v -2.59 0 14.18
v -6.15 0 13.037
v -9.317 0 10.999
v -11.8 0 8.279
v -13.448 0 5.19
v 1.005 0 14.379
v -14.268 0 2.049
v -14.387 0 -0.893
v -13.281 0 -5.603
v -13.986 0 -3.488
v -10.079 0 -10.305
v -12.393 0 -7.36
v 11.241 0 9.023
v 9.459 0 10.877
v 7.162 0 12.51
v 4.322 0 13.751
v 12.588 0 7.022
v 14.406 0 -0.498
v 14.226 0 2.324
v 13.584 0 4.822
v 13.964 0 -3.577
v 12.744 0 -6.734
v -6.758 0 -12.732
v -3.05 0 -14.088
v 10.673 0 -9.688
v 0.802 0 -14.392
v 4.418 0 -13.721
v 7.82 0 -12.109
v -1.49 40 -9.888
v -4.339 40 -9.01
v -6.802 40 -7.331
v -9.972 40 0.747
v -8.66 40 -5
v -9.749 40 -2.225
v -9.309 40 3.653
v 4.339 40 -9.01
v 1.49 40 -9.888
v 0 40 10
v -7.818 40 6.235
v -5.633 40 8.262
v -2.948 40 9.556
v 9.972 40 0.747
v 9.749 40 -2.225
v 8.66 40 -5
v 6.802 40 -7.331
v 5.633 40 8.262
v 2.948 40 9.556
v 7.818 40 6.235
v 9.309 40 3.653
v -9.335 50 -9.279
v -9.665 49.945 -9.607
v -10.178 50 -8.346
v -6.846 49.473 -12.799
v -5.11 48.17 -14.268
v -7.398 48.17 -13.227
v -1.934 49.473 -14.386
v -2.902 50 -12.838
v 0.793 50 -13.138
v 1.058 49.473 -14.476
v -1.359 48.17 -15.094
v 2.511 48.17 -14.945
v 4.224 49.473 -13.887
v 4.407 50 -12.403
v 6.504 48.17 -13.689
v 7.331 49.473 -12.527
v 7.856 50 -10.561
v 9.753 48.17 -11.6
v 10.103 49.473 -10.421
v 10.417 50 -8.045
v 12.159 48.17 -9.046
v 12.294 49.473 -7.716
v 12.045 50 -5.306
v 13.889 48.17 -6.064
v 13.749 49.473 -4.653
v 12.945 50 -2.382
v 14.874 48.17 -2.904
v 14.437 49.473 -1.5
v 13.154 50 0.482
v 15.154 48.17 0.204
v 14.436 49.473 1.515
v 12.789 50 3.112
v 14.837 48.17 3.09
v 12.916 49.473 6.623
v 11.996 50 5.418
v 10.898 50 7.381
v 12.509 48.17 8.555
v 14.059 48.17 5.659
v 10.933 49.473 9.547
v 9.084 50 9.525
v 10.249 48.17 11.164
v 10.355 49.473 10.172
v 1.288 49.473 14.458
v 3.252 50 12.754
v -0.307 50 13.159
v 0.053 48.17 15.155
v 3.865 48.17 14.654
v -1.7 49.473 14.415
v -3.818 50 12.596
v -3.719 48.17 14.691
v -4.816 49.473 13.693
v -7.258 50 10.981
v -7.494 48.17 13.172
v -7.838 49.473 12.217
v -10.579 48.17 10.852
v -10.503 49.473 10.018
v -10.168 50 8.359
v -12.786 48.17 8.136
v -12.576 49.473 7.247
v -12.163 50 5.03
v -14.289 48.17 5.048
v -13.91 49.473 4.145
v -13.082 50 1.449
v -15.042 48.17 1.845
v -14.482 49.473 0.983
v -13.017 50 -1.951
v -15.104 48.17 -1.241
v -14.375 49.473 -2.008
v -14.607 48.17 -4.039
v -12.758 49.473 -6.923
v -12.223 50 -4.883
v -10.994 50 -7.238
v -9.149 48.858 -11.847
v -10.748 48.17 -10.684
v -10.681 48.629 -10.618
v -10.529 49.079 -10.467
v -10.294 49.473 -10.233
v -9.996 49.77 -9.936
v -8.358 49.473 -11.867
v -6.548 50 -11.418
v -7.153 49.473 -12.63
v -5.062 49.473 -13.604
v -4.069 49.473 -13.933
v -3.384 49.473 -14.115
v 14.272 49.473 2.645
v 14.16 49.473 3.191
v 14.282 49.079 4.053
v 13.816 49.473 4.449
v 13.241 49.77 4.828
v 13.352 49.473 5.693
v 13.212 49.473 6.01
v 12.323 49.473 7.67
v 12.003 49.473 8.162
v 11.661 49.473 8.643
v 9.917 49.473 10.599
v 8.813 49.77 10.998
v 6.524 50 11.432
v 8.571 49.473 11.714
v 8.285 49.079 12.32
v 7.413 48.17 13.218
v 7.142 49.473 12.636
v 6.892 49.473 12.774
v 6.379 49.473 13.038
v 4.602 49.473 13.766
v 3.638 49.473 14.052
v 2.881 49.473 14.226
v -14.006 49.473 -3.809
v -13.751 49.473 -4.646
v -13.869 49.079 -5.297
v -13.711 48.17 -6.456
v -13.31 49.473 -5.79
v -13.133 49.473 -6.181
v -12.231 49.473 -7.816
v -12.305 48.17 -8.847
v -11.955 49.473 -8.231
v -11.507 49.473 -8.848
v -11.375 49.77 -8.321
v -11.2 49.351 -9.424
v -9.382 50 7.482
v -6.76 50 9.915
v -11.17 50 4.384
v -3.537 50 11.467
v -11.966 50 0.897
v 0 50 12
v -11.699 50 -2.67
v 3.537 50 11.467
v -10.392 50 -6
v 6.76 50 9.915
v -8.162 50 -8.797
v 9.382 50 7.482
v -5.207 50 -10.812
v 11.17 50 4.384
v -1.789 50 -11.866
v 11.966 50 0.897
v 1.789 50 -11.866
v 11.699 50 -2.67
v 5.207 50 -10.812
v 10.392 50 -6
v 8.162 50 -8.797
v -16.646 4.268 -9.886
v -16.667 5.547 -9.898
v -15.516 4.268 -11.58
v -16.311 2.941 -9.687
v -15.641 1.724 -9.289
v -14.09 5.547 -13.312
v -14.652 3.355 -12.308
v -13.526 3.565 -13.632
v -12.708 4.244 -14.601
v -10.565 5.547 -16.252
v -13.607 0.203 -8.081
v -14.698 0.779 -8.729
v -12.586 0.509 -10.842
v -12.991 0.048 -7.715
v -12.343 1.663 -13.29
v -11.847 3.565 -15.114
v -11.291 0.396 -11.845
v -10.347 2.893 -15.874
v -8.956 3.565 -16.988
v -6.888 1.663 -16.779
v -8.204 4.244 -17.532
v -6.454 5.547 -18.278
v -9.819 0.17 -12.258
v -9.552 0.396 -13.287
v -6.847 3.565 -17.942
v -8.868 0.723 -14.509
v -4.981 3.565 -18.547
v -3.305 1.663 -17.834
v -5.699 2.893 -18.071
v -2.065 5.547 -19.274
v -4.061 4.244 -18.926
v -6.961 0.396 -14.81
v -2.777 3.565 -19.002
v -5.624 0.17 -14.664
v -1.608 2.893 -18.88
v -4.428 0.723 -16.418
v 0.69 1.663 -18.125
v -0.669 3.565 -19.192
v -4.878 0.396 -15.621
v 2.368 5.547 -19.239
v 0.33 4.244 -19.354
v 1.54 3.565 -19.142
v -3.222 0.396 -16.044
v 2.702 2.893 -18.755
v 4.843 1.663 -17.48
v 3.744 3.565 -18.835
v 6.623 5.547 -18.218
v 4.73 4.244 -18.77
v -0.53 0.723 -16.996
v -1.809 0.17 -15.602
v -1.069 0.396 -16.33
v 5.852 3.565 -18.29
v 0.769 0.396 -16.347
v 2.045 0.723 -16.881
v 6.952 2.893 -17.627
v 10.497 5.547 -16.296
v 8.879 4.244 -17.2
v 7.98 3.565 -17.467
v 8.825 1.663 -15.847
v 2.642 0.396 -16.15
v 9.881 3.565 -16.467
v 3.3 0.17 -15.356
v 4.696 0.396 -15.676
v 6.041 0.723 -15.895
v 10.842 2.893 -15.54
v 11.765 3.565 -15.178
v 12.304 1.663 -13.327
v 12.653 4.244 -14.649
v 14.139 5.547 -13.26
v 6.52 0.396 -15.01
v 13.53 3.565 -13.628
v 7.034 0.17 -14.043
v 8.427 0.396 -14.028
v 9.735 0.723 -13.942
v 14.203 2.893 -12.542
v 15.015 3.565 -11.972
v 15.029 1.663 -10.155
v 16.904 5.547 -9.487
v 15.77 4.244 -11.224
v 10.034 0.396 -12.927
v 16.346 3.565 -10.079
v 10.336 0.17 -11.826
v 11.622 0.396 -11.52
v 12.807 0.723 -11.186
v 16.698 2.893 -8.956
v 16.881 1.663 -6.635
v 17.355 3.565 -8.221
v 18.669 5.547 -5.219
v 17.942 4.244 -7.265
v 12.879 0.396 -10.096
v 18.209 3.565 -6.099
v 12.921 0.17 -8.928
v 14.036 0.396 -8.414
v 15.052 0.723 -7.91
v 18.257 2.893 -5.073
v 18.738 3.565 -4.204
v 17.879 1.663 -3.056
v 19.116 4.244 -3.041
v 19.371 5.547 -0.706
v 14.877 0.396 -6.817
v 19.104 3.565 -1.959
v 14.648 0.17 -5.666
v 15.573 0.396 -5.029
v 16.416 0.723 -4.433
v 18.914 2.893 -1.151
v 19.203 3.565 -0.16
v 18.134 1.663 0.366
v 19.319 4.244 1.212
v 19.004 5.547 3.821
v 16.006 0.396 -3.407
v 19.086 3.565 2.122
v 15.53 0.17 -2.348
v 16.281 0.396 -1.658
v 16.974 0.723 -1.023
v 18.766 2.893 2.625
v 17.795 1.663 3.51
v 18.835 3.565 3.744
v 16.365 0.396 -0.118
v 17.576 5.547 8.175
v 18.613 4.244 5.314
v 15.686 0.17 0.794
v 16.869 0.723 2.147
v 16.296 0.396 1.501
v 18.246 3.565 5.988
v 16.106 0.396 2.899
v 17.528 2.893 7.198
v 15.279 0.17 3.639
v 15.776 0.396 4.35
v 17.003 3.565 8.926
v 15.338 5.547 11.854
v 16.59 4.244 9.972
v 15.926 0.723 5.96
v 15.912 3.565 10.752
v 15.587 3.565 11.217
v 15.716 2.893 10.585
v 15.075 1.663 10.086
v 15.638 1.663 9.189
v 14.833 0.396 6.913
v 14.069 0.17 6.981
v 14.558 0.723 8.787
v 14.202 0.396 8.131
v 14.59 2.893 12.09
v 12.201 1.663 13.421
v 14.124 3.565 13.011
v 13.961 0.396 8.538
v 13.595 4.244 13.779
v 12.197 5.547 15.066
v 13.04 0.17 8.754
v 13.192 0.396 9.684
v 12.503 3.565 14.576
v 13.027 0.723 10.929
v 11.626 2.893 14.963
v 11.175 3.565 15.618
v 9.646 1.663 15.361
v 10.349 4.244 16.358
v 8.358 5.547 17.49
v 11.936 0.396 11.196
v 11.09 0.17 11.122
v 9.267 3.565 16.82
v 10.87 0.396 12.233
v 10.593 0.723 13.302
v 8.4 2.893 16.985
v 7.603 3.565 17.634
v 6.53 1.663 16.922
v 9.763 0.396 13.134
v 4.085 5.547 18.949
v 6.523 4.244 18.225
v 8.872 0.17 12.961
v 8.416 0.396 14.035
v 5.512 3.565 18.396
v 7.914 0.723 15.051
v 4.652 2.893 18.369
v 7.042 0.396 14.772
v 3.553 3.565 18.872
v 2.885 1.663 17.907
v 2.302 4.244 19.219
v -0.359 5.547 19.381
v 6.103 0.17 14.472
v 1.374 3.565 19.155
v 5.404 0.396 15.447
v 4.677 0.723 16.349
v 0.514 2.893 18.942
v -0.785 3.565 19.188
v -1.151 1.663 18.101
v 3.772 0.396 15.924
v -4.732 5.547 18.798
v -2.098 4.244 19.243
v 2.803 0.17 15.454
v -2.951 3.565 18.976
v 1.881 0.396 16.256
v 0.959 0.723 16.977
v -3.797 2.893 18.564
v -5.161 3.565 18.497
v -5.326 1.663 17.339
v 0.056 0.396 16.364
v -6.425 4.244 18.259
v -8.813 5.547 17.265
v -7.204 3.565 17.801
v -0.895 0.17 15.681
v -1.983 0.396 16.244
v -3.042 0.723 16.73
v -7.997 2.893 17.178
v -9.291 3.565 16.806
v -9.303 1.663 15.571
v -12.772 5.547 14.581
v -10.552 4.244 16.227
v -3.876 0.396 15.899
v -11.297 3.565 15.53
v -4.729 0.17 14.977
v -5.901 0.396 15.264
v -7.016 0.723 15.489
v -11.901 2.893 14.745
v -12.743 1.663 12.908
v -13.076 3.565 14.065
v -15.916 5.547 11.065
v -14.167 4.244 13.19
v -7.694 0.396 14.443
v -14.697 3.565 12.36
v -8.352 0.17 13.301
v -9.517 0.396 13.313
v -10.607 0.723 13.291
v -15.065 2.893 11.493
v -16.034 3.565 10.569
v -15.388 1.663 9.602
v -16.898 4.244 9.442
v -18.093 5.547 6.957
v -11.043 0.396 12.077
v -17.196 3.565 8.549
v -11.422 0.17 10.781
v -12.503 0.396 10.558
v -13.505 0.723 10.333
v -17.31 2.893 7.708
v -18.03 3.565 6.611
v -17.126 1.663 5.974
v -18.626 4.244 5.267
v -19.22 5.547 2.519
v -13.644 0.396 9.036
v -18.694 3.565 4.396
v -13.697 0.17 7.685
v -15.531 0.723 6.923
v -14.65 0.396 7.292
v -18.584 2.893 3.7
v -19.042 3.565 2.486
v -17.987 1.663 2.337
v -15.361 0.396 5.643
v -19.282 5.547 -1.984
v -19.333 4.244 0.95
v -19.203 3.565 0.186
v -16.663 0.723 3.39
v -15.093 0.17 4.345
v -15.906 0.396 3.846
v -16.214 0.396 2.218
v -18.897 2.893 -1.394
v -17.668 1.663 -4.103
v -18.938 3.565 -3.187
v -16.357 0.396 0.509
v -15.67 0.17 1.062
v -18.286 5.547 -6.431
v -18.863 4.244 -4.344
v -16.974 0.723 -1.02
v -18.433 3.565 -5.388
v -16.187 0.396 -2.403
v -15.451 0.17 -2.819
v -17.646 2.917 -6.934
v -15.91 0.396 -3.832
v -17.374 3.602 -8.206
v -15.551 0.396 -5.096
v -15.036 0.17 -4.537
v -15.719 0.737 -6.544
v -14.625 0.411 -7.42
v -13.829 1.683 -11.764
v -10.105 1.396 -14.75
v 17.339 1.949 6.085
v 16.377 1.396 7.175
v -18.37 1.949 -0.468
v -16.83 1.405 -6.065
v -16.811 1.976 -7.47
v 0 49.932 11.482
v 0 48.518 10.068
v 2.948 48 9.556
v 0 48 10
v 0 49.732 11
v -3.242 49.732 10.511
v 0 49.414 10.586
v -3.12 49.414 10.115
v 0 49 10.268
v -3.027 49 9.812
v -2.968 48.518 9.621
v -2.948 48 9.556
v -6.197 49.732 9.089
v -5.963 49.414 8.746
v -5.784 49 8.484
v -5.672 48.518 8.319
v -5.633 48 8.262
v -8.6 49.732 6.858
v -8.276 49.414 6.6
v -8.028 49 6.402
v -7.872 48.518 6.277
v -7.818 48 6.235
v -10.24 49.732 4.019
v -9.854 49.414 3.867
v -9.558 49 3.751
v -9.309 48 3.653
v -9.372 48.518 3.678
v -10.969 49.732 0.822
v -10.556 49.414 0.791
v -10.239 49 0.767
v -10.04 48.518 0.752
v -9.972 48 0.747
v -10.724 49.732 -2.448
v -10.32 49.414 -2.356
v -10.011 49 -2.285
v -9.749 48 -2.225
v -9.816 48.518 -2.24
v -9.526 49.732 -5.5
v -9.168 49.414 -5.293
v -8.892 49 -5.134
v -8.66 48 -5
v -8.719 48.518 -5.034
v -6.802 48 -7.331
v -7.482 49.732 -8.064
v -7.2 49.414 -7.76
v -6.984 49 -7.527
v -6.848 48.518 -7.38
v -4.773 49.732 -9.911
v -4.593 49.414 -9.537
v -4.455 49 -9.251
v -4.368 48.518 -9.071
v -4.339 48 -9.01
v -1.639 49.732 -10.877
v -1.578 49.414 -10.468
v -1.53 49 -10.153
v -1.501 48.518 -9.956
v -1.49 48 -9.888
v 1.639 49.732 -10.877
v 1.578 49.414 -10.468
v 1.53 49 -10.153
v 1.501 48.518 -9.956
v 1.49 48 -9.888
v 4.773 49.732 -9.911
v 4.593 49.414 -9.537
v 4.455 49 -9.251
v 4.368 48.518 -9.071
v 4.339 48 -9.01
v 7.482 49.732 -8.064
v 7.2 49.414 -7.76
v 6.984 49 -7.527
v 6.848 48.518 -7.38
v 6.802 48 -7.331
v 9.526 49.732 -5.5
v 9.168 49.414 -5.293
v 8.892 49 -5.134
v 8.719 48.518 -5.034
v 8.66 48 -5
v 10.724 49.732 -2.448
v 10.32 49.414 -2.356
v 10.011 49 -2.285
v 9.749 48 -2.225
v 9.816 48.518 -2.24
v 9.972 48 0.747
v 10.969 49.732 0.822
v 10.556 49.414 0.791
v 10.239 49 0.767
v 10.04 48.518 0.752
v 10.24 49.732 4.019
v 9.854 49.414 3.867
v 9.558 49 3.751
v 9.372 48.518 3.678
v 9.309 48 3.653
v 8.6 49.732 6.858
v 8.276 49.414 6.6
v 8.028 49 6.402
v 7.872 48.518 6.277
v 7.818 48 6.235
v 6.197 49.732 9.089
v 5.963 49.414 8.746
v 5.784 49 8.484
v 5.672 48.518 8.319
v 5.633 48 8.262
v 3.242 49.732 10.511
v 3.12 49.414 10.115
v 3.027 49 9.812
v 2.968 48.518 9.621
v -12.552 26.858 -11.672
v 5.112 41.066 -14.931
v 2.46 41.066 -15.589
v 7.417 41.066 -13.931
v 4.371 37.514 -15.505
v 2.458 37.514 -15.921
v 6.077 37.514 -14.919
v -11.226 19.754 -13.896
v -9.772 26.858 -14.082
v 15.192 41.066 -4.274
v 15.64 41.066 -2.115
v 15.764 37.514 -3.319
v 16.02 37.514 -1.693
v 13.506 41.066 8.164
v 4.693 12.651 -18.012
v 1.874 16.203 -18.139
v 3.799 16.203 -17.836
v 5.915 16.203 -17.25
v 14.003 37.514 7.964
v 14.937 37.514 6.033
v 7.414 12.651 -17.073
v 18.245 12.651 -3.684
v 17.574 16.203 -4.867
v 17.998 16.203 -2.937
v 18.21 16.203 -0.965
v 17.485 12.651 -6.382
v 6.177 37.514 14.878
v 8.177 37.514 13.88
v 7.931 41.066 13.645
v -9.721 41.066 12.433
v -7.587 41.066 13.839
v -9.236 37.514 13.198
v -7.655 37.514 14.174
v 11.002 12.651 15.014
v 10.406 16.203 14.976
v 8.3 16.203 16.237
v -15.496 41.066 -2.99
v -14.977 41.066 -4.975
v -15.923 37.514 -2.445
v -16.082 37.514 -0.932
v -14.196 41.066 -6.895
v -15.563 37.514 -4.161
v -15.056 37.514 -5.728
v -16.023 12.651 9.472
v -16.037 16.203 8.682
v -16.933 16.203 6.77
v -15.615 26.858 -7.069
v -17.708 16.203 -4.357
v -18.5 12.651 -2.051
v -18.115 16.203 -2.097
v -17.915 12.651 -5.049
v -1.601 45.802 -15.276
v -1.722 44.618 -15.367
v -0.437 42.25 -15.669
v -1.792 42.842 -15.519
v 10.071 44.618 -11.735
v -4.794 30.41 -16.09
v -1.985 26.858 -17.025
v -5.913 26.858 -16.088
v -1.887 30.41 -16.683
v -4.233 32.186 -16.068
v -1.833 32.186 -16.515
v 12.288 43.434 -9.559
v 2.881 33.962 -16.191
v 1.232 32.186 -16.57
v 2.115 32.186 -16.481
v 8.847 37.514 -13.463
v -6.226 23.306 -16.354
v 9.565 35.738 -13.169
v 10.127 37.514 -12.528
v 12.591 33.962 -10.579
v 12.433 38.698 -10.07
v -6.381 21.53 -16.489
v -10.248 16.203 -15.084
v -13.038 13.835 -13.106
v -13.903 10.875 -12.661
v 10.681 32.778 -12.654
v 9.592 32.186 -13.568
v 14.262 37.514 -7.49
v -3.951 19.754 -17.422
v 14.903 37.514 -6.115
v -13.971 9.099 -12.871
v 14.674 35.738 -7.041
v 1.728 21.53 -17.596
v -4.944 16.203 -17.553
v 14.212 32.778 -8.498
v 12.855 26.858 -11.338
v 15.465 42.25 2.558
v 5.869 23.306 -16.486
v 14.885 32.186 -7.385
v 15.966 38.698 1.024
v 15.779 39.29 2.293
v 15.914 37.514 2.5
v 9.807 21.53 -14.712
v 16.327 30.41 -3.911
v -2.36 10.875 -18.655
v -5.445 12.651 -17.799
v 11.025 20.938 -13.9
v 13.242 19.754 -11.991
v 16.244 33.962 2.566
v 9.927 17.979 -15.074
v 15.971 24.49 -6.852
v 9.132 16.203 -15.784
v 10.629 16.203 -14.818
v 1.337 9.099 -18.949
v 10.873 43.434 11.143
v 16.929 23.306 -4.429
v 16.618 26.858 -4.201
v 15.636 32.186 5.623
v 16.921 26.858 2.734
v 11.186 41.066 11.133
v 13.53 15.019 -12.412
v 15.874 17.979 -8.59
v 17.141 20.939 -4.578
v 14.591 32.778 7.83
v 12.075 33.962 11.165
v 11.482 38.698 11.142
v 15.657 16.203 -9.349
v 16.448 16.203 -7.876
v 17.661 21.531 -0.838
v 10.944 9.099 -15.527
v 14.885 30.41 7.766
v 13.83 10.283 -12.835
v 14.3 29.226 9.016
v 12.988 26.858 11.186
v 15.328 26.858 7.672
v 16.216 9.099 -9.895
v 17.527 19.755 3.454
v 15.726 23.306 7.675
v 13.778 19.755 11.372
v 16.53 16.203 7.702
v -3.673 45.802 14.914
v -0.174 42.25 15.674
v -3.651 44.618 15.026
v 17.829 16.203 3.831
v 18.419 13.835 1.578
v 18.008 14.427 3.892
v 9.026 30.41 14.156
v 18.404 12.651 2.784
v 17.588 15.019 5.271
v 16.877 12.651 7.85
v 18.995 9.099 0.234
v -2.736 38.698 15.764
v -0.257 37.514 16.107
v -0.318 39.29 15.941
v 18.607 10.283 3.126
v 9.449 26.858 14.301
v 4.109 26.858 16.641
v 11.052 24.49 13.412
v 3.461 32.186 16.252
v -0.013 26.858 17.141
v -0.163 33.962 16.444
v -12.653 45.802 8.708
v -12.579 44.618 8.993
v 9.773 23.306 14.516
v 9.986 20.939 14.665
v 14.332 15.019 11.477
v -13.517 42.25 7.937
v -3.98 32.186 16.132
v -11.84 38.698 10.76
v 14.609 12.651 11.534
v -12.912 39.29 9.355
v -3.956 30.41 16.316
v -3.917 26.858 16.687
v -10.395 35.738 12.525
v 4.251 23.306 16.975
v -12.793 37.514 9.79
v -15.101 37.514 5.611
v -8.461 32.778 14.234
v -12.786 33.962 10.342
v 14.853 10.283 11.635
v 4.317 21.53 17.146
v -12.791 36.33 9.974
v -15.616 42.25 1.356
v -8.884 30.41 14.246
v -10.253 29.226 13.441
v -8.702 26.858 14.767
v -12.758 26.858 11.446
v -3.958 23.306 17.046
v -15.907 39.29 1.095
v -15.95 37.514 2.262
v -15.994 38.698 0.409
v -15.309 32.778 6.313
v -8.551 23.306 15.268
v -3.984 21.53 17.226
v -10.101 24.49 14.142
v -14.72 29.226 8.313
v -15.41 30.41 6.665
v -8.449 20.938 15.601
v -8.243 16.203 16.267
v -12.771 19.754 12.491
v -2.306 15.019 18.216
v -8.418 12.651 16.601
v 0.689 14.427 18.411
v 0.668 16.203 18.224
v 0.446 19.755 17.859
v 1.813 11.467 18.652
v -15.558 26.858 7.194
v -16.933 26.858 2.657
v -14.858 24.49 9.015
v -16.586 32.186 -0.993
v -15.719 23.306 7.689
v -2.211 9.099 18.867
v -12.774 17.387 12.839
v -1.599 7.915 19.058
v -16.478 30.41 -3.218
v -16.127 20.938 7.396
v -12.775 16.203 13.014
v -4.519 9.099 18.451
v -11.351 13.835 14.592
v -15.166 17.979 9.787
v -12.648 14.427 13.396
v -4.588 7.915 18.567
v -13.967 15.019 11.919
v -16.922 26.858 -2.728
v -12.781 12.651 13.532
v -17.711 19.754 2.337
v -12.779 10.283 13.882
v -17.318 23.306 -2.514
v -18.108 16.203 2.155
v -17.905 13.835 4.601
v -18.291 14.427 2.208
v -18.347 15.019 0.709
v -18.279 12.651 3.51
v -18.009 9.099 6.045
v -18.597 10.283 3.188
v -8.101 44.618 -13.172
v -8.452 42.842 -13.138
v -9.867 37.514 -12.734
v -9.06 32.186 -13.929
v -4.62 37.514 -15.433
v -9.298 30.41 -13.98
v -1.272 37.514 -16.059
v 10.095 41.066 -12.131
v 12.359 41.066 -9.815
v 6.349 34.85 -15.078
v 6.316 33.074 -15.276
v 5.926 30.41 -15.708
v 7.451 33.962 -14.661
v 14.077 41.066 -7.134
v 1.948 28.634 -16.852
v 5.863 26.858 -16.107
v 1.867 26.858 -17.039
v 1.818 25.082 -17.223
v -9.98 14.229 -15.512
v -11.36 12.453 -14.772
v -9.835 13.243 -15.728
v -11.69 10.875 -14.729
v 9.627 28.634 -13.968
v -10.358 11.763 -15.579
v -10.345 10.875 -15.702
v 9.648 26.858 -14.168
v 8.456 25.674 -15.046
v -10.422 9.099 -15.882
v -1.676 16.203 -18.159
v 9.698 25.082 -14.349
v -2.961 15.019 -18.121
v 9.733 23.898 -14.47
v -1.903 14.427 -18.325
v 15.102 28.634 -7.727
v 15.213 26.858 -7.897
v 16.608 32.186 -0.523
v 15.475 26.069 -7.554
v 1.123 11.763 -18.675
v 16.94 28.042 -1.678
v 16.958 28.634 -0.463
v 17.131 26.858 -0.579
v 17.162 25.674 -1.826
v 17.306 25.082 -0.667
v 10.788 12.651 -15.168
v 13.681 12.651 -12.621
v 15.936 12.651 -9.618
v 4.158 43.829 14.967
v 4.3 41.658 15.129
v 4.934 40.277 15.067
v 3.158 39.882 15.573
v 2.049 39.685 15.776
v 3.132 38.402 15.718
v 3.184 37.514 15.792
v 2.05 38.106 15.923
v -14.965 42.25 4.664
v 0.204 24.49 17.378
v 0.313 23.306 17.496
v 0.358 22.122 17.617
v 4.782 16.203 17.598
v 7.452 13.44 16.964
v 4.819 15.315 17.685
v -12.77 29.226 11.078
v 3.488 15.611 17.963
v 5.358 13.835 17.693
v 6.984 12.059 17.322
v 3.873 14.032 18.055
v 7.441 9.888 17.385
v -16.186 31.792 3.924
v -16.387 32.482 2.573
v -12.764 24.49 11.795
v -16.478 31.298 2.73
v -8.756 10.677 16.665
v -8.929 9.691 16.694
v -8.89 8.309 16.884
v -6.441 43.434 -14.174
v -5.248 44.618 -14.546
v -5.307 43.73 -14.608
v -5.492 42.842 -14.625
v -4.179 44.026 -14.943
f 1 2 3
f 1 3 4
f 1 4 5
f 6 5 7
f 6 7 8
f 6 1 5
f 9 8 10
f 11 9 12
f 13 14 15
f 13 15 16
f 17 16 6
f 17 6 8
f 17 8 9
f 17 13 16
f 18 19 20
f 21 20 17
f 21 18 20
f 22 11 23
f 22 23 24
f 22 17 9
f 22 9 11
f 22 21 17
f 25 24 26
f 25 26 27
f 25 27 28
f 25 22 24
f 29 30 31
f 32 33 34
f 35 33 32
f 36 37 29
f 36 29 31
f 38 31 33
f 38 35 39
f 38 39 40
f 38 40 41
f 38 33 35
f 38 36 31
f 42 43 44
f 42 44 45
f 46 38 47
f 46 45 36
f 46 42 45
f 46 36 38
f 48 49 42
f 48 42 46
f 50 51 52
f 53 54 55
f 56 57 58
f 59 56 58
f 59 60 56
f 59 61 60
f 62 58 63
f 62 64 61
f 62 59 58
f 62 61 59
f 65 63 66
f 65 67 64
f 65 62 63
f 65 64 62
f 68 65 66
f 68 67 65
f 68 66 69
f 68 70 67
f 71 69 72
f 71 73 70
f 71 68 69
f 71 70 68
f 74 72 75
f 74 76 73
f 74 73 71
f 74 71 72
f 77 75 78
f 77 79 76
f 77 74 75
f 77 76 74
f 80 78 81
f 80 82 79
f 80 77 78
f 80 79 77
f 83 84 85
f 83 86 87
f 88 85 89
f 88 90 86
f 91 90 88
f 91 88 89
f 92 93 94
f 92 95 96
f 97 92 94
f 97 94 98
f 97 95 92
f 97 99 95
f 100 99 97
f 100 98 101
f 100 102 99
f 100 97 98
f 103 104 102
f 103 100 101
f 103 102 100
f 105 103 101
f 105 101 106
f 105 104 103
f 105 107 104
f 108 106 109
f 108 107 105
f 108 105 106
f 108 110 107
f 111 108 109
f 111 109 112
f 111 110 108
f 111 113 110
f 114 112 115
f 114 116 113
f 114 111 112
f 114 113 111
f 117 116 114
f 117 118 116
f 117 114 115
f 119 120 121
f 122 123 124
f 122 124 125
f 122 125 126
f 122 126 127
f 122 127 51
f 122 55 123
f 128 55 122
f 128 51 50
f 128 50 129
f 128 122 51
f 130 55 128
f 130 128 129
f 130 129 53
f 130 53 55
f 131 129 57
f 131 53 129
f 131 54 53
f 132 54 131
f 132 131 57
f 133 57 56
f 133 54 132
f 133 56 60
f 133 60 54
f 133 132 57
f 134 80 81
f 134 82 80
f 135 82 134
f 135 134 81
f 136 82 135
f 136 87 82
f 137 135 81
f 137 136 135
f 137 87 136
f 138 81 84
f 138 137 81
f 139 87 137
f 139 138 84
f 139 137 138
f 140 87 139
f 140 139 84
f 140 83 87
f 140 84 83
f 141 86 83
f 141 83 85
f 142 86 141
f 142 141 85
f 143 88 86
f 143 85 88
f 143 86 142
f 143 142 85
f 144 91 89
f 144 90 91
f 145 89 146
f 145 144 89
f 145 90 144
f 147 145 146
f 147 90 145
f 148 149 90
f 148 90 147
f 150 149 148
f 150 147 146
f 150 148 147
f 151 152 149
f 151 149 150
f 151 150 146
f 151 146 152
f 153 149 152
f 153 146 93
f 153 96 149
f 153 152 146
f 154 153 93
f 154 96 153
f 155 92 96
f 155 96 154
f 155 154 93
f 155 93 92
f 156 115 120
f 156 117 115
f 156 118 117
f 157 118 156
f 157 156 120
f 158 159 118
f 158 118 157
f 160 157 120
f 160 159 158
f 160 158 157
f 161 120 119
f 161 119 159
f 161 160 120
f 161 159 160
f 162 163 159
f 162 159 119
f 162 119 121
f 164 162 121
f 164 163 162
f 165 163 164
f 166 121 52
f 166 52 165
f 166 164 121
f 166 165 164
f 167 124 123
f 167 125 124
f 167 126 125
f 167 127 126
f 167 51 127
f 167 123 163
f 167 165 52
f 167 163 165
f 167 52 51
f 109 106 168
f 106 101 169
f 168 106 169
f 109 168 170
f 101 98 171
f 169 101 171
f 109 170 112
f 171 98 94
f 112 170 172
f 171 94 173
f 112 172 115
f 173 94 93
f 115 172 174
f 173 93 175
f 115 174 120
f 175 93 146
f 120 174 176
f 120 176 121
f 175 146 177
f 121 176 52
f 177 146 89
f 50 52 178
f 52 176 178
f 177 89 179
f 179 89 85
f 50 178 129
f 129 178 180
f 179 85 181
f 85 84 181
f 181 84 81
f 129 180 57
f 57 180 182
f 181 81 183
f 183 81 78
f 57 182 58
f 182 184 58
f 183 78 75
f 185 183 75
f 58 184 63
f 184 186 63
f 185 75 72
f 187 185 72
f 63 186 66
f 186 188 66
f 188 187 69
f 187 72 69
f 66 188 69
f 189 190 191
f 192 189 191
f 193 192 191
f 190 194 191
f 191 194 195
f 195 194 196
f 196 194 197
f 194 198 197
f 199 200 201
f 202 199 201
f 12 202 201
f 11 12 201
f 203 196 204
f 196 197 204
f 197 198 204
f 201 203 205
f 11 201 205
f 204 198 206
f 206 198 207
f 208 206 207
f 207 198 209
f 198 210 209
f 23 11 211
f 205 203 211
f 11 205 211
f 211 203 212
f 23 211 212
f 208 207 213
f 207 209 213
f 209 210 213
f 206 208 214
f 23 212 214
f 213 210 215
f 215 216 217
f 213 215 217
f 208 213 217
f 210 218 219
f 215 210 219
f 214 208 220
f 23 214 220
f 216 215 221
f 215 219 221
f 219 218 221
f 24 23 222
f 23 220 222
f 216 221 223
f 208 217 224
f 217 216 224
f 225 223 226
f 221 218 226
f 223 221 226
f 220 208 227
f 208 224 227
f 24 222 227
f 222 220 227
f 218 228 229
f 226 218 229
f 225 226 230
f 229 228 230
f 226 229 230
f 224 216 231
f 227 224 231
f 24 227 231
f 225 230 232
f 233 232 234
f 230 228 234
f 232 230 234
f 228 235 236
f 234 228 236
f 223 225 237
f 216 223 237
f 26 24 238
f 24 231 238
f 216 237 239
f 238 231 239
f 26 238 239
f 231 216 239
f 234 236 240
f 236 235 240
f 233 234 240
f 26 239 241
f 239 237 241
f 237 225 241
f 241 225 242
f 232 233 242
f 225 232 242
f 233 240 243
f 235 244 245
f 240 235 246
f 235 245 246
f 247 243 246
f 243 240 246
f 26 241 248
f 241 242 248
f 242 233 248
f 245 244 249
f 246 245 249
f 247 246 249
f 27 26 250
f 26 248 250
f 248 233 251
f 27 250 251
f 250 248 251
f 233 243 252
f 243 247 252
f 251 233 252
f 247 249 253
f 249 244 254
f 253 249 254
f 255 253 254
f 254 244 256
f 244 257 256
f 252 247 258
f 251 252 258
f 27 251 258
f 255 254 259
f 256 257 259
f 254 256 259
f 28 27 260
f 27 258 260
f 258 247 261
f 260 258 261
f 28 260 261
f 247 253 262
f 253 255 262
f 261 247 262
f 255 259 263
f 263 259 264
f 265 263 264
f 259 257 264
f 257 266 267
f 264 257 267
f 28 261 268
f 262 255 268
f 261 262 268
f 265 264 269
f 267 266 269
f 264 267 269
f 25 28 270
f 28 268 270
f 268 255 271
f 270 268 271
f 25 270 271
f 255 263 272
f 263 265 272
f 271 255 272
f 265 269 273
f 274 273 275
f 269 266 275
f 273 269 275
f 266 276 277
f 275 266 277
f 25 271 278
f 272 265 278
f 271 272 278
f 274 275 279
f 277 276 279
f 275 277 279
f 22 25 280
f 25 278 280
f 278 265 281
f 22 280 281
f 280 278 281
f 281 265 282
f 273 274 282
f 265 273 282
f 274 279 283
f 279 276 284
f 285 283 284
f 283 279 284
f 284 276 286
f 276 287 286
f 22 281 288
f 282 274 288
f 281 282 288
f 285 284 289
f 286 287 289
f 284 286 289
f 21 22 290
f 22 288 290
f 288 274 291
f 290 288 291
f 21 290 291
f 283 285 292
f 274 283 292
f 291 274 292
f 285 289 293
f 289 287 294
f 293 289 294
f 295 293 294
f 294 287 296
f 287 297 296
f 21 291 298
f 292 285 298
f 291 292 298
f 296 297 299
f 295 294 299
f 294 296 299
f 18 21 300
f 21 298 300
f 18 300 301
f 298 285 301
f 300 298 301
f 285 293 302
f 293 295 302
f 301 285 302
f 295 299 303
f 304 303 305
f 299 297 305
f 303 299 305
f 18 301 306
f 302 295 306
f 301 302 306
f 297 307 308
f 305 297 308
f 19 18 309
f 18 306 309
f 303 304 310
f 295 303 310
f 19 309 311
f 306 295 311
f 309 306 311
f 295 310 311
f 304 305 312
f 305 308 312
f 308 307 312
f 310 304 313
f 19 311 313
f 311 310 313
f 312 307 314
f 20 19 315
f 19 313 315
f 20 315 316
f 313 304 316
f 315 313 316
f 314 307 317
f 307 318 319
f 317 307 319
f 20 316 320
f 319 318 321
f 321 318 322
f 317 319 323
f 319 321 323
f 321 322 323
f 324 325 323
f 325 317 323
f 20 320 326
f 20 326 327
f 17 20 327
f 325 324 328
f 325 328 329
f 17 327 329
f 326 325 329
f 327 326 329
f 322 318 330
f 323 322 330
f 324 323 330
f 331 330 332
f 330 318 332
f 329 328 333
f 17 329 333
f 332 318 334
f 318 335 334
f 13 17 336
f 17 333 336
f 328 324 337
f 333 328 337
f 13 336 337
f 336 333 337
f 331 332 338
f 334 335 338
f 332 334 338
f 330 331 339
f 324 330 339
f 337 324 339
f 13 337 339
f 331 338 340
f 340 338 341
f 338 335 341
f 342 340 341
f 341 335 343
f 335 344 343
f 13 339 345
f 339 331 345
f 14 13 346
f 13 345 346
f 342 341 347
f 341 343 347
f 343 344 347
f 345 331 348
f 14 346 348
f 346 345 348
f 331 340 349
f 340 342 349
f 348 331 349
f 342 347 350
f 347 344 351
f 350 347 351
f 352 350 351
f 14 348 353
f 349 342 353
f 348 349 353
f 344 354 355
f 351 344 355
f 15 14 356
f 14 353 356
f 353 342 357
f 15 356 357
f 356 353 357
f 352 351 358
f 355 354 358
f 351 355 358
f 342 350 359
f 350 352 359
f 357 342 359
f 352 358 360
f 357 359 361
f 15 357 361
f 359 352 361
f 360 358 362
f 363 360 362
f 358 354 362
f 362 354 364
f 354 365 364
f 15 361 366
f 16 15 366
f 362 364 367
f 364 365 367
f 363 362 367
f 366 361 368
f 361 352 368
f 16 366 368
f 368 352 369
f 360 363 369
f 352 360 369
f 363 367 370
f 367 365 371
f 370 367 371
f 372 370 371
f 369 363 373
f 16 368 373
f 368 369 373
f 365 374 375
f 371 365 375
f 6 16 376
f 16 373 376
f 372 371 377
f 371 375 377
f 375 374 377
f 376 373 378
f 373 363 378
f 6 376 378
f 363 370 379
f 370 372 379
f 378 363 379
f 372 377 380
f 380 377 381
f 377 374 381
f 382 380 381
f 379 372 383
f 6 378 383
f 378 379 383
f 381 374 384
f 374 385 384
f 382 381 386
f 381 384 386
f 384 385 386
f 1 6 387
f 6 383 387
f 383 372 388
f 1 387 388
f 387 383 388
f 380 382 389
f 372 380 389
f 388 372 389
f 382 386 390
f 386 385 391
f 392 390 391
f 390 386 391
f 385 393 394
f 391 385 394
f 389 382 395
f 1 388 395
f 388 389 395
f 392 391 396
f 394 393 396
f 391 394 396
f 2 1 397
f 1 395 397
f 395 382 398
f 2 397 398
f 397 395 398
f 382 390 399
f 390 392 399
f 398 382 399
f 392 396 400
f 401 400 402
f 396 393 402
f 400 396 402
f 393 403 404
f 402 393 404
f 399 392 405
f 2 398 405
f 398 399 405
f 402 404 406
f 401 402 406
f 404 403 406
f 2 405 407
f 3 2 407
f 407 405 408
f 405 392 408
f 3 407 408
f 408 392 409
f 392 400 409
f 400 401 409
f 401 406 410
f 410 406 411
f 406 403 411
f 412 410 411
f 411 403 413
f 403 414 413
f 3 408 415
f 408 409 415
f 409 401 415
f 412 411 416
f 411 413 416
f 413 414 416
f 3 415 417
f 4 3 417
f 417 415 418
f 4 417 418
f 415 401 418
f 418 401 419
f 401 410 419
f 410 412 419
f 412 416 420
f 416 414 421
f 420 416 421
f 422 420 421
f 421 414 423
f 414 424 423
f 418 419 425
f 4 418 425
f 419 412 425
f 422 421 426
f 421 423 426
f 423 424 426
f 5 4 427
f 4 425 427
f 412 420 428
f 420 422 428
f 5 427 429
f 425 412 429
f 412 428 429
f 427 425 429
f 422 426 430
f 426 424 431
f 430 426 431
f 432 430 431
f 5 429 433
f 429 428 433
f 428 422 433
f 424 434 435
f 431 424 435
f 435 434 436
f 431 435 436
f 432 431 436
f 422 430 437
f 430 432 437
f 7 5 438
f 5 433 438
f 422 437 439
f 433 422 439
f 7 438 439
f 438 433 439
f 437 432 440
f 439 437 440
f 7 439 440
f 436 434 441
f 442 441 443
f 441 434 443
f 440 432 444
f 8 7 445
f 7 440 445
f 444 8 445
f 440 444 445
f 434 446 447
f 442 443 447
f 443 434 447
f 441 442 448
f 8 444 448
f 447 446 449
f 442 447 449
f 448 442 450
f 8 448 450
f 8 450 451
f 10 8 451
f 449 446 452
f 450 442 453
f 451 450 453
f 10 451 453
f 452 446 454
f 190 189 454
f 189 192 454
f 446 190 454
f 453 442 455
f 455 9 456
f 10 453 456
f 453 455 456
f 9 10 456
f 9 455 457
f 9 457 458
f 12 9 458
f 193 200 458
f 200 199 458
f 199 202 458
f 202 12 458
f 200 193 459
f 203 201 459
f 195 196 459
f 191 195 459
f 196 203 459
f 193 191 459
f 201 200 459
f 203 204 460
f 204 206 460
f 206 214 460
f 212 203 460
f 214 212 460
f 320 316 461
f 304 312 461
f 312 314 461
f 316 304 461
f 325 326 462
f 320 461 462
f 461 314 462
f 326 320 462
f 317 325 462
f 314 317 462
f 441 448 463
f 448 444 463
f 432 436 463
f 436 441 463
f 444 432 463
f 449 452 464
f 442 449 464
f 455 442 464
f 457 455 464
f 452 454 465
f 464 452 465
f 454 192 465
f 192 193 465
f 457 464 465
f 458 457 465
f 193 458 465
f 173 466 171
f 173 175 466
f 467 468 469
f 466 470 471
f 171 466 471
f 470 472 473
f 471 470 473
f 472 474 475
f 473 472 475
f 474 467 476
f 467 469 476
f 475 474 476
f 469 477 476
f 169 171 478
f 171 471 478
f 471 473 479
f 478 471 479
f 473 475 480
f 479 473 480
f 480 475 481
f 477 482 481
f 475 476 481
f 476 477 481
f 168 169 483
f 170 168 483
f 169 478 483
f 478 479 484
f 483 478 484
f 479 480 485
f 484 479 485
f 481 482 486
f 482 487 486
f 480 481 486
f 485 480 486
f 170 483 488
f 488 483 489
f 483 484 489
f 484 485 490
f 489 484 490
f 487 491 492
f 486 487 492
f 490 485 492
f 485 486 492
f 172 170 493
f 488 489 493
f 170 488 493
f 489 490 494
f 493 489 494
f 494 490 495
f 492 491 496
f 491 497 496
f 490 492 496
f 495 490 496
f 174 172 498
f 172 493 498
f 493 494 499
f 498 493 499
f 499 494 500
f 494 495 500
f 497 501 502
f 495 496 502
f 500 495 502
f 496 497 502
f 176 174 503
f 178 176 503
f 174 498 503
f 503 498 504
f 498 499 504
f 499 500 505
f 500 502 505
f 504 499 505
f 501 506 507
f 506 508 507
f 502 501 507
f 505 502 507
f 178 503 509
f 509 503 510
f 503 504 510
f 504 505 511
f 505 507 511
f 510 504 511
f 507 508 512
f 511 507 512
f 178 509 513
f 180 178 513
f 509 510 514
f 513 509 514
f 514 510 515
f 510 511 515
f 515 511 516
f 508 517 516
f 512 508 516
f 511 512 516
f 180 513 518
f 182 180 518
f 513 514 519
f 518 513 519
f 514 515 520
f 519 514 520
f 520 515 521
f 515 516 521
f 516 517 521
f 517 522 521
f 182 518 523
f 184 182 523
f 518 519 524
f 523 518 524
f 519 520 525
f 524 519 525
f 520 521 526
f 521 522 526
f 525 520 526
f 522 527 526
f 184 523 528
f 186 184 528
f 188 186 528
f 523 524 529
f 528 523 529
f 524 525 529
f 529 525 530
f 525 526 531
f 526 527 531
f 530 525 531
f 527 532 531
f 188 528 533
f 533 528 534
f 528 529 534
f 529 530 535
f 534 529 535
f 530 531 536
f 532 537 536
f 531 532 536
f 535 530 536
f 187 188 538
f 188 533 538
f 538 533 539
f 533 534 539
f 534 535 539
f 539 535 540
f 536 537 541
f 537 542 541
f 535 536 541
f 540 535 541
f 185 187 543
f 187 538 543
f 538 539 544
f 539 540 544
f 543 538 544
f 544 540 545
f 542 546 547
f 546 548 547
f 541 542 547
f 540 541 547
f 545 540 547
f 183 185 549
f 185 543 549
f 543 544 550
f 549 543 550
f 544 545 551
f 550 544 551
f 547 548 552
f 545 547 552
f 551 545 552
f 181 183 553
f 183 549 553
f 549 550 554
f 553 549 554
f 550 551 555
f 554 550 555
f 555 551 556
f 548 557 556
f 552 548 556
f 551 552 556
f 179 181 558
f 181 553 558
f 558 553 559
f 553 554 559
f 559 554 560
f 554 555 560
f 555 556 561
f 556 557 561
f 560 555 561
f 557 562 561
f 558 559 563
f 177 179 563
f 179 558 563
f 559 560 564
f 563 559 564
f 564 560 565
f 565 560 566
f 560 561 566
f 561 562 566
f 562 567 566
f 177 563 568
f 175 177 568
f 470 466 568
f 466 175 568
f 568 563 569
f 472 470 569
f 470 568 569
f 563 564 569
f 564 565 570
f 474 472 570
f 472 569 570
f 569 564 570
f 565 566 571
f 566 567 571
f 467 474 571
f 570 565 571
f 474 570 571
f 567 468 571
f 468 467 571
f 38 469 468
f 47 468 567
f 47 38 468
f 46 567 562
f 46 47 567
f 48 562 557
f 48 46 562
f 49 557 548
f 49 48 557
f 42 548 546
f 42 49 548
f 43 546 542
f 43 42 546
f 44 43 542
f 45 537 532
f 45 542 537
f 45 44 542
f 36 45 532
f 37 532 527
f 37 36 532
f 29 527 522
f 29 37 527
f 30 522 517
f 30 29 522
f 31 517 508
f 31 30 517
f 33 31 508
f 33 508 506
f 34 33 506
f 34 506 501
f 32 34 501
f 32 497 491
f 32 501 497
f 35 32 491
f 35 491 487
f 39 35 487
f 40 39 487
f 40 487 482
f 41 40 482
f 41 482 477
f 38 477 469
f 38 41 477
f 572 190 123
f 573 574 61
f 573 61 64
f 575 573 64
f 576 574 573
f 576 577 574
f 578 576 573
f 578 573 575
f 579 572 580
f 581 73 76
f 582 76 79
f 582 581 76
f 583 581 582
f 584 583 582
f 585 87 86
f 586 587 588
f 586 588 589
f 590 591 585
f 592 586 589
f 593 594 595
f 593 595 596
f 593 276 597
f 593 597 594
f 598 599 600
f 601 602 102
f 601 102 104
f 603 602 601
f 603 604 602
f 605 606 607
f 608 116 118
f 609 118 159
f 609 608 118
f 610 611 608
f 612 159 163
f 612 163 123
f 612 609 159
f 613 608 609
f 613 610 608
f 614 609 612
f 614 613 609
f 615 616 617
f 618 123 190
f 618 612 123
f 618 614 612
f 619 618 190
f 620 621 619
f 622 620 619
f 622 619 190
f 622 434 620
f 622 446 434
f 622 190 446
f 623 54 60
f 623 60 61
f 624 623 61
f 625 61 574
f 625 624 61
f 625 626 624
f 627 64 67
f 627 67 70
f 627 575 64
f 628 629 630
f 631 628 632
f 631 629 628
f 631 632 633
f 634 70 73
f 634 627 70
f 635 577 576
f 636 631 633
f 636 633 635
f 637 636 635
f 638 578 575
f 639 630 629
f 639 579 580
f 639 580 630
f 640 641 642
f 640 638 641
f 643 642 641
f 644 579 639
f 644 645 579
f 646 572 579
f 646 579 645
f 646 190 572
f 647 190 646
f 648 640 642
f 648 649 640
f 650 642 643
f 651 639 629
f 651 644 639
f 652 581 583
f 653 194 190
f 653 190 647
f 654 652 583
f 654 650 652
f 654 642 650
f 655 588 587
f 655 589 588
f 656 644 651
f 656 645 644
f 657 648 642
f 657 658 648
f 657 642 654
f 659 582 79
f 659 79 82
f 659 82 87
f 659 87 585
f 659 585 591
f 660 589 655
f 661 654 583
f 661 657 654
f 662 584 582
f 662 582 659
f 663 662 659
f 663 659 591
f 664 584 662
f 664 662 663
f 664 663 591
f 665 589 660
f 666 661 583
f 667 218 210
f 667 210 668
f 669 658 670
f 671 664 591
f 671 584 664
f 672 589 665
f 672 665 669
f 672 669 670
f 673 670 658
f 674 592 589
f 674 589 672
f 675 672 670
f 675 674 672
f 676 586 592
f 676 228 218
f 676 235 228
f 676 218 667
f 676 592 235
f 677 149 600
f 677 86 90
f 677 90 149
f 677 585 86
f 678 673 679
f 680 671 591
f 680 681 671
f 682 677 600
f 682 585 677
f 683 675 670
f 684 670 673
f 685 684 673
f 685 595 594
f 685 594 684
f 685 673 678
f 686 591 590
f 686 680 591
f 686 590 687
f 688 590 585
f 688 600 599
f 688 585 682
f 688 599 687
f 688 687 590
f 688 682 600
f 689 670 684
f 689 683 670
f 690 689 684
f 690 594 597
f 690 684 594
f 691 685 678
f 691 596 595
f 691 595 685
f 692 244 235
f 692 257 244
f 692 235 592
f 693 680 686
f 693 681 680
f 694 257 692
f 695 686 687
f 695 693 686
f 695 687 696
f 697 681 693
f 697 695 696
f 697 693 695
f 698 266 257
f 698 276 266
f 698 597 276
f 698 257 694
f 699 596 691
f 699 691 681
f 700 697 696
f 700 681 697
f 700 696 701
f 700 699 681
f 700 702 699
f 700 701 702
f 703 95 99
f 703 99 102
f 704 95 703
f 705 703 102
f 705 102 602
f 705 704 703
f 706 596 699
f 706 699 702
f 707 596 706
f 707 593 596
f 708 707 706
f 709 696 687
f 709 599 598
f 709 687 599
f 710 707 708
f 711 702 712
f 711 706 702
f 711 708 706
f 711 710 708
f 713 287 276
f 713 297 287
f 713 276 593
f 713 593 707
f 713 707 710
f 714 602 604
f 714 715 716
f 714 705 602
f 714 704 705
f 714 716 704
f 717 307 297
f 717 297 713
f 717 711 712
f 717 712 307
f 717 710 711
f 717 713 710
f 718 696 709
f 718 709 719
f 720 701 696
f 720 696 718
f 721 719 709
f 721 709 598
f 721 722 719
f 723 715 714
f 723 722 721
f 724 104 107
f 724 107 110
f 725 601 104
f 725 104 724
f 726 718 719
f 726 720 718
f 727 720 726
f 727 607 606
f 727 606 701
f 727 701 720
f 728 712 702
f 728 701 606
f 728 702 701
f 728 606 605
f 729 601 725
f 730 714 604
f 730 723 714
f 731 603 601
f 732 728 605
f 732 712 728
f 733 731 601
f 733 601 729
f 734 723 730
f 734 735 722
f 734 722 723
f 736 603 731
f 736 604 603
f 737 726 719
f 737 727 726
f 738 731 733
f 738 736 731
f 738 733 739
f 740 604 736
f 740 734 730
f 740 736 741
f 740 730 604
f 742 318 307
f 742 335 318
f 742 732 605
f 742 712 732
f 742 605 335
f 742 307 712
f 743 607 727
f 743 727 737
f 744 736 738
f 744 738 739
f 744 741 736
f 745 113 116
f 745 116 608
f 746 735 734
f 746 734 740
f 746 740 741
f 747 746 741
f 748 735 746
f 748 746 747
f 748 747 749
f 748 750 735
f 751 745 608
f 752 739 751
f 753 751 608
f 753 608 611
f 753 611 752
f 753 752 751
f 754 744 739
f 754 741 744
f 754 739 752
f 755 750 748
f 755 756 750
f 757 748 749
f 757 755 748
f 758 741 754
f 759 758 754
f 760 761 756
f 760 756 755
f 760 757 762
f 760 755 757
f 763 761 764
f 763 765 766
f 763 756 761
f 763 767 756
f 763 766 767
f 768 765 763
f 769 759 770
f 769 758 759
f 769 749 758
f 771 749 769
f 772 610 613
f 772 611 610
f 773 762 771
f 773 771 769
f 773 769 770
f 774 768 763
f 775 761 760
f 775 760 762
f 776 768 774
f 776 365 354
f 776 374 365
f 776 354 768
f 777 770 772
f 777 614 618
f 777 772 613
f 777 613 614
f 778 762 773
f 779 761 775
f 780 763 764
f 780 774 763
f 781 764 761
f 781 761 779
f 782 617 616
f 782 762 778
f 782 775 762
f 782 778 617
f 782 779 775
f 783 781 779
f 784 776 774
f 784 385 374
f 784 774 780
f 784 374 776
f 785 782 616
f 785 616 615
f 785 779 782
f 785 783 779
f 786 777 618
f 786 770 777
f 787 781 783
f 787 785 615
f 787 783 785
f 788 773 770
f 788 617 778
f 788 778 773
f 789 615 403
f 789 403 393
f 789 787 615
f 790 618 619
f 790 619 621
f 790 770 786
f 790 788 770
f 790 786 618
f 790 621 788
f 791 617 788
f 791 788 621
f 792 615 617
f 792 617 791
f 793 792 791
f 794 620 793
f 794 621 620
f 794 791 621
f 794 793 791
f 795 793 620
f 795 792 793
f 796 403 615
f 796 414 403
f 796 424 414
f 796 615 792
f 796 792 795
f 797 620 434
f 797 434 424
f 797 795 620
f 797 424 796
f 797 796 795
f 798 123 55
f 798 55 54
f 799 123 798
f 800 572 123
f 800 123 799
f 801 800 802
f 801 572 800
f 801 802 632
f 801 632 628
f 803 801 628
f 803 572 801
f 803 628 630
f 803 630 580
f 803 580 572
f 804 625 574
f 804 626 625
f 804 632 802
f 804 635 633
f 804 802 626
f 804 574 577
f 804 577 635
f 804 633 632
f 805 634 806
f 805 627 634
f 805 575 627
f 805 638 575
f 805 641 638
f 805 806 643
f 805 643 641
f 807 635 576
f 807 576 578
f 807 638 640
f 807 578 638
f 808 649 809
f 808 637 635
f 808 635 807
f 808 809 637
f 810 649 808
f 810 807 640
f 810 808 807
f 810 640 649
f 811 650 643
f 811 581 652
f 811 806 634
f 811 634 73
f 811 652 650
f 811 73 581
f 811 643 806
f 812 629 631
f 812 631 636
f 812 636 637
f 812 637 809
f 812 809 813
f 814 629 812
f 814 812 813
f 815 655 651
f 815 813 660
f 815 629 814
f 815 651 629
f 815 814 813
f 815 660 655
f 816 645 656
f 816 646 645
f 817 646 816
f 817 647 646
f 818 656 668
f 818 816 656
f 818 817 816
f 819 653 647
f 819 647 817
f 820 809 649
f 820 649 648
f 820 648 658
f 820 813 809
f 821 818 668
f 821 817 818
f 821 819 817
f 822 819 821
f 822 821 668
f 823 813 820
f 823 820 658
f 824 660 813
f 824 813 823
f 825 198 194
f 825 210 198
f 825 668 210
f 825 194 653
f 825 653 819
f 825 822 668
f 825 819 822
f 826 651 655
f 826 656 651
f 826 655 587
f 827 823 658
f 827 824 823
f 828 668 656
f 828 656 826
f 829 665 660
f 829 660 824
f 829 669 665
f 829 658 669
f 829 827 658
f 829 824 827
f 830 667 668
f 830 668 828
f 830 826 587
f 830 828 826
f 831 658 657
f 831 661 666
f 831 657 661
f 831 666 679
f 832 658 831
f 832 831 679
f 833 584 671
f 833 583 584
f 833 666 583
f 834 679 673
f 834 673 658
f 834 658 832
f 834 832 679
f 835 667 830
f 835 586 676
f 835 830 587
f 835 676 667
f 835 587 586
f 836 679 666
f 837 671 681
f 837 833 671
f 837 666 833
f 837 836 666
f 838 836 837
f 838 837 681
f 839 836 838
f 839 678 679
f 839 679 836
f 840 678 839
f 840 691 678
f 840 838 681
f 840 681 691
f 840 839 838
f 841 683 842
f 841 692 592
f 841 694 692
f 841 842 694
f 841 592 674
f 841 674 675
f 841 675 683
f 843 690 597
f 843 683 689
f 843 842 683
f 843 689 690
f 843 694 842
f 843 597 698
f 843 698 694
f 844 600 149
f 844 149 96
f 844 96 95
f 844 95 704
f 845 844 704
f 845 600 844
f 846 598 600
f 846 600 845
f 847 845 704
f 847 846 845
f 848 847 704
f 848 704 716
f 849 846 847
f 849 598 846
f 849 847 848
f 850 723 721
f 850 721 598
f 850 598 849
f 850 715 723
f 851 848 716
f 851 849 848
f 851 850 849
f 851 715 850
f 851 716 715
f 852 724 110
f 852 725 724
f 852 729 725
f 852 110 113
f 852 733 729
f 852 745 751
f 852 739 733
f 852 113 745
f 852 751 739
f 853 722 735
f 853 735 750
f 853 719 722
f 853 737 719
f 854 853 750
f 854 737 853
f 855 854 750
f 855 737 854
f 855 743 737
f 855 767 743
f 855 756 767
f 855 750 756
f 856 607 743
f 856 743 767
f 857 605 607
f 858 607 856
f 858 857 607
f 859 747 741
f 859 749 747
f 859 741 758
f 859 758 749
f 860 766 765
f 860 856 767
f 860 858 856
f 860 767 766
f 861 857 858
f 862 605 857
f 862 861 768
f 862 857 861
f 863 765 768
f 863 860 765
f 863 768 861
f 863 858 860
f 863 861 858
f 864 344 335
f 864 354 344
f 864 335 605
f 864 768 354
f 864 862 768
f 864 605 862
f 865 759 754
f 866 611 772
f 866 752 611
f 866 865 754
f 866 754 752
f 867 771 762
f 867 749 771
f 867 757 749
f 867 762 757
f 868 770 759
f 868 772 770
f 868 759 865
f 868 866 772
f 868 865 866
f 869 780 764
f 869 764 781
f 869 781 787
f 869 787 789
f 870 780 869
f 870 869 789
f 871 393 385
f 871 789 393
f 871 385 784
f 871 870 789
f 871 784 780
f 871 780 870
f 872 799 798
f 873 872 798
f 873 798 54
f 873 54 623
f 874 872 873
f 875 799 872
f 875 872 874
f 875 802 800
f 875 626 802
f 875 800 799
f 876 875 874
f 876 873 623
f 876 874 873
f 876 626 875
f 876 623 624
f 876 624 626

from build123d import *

# Parameters (mm, degrees)
CUT_EXTRUDE1_DEPTH      = 58.445626622
CUT_EXTRUDE1_DEPTH_BACK = 10
SKETCH3_R               = 10
FILLET4_R               = 5
FILLET5_R               = 2


with BuildPart() as part:
    # Loft1: read off the stored shape, not the designer's step
    # Loft1: loft between two sections, ruled curve by curve
    loft1_from = [
        Edge.make_bspline([(-10.493972108, 50, -10.718047835), (10.942123561, 50, -31.705992052), (31.930067778, 50, -10.269896382), (10.493972108, 50, 10.718047835), (-10.942123561, 50, 31.705992052), (-31.930067778, 50, 10.269896382), (-10.493972108, 50, -10.718047835)], [0, 0, 0, 0, 0.5, 0.5, 0.5, 1, 1, 1, 1], 3, [1, 0.333333333, 0.333333333, 1, 0.333333333, 0.333333333, 1]),
    ]
    loft1_to = [
        Edge.make_bspline([(-17.436793853, 0, -9.795826669), (2.154859485, 0, -44.669414375), (37.028447191, 0, -25.077761037), (17.436793853, 0, 9.795826669), (-2.154859485, 0, 44.669414375), (-37.028447191, 0, 25.077761037), (-17.436793853, 0, -9.795826669)], [0, 0, 0, 0, 0.5, 0.5, 0.5, 1, 1, 1, 1], 3, [1, 0.333333333, 0.333333333, 1, 0.333333333, 0.333333333, 1]),
    ]
    loft1 = Solid(Shell([*[Face.make_surface_from_curves(loft1_from[k], loft1_to[k]) for k in range(1)], Face(Wire(loft1_from)), Face(Wire(loft1_to))]))
    add(loft1)

    # Sketch3 → Cut-Extrude1 (cut, two sides: drawn at the far end of the back side and taken through both)
    with BuildSketch(Plane(origin=(0, 50, 0), x_dir=(1, 0, 0), z_dir=(0, 1, 0)).offset(-CUT_EXTRUDE1_DEPTH_BACK)):
        with Locations(Location((0, 0, 0), (0, 0, 270))):
            Circle(SKETCH3_R)
    extrude(amount=CUT_EXTRUDE1_DEPTH + CUT_EXTRUDE1_DEPTH_BACK, mode=Mode.SUBTRACT)

    # Fillet4
    fillet4_edges = [part.edges().sort_by_distance(p)[0] for p in [
        (17.436793853, 0, 9.795826669),
    ]]
    fillet(fillet4_edges, radius=FILLET4_R)

    # Fillet5
    fillet5_edges = [part.edges().sort_by_distance(p)[0] for p in [
        (10.493972108, 50, 10.718047835),
        (0, 50, -10),
    ]]
    fillet(fillet5_edges, radius=FILLET5_R)


solid = part.part
